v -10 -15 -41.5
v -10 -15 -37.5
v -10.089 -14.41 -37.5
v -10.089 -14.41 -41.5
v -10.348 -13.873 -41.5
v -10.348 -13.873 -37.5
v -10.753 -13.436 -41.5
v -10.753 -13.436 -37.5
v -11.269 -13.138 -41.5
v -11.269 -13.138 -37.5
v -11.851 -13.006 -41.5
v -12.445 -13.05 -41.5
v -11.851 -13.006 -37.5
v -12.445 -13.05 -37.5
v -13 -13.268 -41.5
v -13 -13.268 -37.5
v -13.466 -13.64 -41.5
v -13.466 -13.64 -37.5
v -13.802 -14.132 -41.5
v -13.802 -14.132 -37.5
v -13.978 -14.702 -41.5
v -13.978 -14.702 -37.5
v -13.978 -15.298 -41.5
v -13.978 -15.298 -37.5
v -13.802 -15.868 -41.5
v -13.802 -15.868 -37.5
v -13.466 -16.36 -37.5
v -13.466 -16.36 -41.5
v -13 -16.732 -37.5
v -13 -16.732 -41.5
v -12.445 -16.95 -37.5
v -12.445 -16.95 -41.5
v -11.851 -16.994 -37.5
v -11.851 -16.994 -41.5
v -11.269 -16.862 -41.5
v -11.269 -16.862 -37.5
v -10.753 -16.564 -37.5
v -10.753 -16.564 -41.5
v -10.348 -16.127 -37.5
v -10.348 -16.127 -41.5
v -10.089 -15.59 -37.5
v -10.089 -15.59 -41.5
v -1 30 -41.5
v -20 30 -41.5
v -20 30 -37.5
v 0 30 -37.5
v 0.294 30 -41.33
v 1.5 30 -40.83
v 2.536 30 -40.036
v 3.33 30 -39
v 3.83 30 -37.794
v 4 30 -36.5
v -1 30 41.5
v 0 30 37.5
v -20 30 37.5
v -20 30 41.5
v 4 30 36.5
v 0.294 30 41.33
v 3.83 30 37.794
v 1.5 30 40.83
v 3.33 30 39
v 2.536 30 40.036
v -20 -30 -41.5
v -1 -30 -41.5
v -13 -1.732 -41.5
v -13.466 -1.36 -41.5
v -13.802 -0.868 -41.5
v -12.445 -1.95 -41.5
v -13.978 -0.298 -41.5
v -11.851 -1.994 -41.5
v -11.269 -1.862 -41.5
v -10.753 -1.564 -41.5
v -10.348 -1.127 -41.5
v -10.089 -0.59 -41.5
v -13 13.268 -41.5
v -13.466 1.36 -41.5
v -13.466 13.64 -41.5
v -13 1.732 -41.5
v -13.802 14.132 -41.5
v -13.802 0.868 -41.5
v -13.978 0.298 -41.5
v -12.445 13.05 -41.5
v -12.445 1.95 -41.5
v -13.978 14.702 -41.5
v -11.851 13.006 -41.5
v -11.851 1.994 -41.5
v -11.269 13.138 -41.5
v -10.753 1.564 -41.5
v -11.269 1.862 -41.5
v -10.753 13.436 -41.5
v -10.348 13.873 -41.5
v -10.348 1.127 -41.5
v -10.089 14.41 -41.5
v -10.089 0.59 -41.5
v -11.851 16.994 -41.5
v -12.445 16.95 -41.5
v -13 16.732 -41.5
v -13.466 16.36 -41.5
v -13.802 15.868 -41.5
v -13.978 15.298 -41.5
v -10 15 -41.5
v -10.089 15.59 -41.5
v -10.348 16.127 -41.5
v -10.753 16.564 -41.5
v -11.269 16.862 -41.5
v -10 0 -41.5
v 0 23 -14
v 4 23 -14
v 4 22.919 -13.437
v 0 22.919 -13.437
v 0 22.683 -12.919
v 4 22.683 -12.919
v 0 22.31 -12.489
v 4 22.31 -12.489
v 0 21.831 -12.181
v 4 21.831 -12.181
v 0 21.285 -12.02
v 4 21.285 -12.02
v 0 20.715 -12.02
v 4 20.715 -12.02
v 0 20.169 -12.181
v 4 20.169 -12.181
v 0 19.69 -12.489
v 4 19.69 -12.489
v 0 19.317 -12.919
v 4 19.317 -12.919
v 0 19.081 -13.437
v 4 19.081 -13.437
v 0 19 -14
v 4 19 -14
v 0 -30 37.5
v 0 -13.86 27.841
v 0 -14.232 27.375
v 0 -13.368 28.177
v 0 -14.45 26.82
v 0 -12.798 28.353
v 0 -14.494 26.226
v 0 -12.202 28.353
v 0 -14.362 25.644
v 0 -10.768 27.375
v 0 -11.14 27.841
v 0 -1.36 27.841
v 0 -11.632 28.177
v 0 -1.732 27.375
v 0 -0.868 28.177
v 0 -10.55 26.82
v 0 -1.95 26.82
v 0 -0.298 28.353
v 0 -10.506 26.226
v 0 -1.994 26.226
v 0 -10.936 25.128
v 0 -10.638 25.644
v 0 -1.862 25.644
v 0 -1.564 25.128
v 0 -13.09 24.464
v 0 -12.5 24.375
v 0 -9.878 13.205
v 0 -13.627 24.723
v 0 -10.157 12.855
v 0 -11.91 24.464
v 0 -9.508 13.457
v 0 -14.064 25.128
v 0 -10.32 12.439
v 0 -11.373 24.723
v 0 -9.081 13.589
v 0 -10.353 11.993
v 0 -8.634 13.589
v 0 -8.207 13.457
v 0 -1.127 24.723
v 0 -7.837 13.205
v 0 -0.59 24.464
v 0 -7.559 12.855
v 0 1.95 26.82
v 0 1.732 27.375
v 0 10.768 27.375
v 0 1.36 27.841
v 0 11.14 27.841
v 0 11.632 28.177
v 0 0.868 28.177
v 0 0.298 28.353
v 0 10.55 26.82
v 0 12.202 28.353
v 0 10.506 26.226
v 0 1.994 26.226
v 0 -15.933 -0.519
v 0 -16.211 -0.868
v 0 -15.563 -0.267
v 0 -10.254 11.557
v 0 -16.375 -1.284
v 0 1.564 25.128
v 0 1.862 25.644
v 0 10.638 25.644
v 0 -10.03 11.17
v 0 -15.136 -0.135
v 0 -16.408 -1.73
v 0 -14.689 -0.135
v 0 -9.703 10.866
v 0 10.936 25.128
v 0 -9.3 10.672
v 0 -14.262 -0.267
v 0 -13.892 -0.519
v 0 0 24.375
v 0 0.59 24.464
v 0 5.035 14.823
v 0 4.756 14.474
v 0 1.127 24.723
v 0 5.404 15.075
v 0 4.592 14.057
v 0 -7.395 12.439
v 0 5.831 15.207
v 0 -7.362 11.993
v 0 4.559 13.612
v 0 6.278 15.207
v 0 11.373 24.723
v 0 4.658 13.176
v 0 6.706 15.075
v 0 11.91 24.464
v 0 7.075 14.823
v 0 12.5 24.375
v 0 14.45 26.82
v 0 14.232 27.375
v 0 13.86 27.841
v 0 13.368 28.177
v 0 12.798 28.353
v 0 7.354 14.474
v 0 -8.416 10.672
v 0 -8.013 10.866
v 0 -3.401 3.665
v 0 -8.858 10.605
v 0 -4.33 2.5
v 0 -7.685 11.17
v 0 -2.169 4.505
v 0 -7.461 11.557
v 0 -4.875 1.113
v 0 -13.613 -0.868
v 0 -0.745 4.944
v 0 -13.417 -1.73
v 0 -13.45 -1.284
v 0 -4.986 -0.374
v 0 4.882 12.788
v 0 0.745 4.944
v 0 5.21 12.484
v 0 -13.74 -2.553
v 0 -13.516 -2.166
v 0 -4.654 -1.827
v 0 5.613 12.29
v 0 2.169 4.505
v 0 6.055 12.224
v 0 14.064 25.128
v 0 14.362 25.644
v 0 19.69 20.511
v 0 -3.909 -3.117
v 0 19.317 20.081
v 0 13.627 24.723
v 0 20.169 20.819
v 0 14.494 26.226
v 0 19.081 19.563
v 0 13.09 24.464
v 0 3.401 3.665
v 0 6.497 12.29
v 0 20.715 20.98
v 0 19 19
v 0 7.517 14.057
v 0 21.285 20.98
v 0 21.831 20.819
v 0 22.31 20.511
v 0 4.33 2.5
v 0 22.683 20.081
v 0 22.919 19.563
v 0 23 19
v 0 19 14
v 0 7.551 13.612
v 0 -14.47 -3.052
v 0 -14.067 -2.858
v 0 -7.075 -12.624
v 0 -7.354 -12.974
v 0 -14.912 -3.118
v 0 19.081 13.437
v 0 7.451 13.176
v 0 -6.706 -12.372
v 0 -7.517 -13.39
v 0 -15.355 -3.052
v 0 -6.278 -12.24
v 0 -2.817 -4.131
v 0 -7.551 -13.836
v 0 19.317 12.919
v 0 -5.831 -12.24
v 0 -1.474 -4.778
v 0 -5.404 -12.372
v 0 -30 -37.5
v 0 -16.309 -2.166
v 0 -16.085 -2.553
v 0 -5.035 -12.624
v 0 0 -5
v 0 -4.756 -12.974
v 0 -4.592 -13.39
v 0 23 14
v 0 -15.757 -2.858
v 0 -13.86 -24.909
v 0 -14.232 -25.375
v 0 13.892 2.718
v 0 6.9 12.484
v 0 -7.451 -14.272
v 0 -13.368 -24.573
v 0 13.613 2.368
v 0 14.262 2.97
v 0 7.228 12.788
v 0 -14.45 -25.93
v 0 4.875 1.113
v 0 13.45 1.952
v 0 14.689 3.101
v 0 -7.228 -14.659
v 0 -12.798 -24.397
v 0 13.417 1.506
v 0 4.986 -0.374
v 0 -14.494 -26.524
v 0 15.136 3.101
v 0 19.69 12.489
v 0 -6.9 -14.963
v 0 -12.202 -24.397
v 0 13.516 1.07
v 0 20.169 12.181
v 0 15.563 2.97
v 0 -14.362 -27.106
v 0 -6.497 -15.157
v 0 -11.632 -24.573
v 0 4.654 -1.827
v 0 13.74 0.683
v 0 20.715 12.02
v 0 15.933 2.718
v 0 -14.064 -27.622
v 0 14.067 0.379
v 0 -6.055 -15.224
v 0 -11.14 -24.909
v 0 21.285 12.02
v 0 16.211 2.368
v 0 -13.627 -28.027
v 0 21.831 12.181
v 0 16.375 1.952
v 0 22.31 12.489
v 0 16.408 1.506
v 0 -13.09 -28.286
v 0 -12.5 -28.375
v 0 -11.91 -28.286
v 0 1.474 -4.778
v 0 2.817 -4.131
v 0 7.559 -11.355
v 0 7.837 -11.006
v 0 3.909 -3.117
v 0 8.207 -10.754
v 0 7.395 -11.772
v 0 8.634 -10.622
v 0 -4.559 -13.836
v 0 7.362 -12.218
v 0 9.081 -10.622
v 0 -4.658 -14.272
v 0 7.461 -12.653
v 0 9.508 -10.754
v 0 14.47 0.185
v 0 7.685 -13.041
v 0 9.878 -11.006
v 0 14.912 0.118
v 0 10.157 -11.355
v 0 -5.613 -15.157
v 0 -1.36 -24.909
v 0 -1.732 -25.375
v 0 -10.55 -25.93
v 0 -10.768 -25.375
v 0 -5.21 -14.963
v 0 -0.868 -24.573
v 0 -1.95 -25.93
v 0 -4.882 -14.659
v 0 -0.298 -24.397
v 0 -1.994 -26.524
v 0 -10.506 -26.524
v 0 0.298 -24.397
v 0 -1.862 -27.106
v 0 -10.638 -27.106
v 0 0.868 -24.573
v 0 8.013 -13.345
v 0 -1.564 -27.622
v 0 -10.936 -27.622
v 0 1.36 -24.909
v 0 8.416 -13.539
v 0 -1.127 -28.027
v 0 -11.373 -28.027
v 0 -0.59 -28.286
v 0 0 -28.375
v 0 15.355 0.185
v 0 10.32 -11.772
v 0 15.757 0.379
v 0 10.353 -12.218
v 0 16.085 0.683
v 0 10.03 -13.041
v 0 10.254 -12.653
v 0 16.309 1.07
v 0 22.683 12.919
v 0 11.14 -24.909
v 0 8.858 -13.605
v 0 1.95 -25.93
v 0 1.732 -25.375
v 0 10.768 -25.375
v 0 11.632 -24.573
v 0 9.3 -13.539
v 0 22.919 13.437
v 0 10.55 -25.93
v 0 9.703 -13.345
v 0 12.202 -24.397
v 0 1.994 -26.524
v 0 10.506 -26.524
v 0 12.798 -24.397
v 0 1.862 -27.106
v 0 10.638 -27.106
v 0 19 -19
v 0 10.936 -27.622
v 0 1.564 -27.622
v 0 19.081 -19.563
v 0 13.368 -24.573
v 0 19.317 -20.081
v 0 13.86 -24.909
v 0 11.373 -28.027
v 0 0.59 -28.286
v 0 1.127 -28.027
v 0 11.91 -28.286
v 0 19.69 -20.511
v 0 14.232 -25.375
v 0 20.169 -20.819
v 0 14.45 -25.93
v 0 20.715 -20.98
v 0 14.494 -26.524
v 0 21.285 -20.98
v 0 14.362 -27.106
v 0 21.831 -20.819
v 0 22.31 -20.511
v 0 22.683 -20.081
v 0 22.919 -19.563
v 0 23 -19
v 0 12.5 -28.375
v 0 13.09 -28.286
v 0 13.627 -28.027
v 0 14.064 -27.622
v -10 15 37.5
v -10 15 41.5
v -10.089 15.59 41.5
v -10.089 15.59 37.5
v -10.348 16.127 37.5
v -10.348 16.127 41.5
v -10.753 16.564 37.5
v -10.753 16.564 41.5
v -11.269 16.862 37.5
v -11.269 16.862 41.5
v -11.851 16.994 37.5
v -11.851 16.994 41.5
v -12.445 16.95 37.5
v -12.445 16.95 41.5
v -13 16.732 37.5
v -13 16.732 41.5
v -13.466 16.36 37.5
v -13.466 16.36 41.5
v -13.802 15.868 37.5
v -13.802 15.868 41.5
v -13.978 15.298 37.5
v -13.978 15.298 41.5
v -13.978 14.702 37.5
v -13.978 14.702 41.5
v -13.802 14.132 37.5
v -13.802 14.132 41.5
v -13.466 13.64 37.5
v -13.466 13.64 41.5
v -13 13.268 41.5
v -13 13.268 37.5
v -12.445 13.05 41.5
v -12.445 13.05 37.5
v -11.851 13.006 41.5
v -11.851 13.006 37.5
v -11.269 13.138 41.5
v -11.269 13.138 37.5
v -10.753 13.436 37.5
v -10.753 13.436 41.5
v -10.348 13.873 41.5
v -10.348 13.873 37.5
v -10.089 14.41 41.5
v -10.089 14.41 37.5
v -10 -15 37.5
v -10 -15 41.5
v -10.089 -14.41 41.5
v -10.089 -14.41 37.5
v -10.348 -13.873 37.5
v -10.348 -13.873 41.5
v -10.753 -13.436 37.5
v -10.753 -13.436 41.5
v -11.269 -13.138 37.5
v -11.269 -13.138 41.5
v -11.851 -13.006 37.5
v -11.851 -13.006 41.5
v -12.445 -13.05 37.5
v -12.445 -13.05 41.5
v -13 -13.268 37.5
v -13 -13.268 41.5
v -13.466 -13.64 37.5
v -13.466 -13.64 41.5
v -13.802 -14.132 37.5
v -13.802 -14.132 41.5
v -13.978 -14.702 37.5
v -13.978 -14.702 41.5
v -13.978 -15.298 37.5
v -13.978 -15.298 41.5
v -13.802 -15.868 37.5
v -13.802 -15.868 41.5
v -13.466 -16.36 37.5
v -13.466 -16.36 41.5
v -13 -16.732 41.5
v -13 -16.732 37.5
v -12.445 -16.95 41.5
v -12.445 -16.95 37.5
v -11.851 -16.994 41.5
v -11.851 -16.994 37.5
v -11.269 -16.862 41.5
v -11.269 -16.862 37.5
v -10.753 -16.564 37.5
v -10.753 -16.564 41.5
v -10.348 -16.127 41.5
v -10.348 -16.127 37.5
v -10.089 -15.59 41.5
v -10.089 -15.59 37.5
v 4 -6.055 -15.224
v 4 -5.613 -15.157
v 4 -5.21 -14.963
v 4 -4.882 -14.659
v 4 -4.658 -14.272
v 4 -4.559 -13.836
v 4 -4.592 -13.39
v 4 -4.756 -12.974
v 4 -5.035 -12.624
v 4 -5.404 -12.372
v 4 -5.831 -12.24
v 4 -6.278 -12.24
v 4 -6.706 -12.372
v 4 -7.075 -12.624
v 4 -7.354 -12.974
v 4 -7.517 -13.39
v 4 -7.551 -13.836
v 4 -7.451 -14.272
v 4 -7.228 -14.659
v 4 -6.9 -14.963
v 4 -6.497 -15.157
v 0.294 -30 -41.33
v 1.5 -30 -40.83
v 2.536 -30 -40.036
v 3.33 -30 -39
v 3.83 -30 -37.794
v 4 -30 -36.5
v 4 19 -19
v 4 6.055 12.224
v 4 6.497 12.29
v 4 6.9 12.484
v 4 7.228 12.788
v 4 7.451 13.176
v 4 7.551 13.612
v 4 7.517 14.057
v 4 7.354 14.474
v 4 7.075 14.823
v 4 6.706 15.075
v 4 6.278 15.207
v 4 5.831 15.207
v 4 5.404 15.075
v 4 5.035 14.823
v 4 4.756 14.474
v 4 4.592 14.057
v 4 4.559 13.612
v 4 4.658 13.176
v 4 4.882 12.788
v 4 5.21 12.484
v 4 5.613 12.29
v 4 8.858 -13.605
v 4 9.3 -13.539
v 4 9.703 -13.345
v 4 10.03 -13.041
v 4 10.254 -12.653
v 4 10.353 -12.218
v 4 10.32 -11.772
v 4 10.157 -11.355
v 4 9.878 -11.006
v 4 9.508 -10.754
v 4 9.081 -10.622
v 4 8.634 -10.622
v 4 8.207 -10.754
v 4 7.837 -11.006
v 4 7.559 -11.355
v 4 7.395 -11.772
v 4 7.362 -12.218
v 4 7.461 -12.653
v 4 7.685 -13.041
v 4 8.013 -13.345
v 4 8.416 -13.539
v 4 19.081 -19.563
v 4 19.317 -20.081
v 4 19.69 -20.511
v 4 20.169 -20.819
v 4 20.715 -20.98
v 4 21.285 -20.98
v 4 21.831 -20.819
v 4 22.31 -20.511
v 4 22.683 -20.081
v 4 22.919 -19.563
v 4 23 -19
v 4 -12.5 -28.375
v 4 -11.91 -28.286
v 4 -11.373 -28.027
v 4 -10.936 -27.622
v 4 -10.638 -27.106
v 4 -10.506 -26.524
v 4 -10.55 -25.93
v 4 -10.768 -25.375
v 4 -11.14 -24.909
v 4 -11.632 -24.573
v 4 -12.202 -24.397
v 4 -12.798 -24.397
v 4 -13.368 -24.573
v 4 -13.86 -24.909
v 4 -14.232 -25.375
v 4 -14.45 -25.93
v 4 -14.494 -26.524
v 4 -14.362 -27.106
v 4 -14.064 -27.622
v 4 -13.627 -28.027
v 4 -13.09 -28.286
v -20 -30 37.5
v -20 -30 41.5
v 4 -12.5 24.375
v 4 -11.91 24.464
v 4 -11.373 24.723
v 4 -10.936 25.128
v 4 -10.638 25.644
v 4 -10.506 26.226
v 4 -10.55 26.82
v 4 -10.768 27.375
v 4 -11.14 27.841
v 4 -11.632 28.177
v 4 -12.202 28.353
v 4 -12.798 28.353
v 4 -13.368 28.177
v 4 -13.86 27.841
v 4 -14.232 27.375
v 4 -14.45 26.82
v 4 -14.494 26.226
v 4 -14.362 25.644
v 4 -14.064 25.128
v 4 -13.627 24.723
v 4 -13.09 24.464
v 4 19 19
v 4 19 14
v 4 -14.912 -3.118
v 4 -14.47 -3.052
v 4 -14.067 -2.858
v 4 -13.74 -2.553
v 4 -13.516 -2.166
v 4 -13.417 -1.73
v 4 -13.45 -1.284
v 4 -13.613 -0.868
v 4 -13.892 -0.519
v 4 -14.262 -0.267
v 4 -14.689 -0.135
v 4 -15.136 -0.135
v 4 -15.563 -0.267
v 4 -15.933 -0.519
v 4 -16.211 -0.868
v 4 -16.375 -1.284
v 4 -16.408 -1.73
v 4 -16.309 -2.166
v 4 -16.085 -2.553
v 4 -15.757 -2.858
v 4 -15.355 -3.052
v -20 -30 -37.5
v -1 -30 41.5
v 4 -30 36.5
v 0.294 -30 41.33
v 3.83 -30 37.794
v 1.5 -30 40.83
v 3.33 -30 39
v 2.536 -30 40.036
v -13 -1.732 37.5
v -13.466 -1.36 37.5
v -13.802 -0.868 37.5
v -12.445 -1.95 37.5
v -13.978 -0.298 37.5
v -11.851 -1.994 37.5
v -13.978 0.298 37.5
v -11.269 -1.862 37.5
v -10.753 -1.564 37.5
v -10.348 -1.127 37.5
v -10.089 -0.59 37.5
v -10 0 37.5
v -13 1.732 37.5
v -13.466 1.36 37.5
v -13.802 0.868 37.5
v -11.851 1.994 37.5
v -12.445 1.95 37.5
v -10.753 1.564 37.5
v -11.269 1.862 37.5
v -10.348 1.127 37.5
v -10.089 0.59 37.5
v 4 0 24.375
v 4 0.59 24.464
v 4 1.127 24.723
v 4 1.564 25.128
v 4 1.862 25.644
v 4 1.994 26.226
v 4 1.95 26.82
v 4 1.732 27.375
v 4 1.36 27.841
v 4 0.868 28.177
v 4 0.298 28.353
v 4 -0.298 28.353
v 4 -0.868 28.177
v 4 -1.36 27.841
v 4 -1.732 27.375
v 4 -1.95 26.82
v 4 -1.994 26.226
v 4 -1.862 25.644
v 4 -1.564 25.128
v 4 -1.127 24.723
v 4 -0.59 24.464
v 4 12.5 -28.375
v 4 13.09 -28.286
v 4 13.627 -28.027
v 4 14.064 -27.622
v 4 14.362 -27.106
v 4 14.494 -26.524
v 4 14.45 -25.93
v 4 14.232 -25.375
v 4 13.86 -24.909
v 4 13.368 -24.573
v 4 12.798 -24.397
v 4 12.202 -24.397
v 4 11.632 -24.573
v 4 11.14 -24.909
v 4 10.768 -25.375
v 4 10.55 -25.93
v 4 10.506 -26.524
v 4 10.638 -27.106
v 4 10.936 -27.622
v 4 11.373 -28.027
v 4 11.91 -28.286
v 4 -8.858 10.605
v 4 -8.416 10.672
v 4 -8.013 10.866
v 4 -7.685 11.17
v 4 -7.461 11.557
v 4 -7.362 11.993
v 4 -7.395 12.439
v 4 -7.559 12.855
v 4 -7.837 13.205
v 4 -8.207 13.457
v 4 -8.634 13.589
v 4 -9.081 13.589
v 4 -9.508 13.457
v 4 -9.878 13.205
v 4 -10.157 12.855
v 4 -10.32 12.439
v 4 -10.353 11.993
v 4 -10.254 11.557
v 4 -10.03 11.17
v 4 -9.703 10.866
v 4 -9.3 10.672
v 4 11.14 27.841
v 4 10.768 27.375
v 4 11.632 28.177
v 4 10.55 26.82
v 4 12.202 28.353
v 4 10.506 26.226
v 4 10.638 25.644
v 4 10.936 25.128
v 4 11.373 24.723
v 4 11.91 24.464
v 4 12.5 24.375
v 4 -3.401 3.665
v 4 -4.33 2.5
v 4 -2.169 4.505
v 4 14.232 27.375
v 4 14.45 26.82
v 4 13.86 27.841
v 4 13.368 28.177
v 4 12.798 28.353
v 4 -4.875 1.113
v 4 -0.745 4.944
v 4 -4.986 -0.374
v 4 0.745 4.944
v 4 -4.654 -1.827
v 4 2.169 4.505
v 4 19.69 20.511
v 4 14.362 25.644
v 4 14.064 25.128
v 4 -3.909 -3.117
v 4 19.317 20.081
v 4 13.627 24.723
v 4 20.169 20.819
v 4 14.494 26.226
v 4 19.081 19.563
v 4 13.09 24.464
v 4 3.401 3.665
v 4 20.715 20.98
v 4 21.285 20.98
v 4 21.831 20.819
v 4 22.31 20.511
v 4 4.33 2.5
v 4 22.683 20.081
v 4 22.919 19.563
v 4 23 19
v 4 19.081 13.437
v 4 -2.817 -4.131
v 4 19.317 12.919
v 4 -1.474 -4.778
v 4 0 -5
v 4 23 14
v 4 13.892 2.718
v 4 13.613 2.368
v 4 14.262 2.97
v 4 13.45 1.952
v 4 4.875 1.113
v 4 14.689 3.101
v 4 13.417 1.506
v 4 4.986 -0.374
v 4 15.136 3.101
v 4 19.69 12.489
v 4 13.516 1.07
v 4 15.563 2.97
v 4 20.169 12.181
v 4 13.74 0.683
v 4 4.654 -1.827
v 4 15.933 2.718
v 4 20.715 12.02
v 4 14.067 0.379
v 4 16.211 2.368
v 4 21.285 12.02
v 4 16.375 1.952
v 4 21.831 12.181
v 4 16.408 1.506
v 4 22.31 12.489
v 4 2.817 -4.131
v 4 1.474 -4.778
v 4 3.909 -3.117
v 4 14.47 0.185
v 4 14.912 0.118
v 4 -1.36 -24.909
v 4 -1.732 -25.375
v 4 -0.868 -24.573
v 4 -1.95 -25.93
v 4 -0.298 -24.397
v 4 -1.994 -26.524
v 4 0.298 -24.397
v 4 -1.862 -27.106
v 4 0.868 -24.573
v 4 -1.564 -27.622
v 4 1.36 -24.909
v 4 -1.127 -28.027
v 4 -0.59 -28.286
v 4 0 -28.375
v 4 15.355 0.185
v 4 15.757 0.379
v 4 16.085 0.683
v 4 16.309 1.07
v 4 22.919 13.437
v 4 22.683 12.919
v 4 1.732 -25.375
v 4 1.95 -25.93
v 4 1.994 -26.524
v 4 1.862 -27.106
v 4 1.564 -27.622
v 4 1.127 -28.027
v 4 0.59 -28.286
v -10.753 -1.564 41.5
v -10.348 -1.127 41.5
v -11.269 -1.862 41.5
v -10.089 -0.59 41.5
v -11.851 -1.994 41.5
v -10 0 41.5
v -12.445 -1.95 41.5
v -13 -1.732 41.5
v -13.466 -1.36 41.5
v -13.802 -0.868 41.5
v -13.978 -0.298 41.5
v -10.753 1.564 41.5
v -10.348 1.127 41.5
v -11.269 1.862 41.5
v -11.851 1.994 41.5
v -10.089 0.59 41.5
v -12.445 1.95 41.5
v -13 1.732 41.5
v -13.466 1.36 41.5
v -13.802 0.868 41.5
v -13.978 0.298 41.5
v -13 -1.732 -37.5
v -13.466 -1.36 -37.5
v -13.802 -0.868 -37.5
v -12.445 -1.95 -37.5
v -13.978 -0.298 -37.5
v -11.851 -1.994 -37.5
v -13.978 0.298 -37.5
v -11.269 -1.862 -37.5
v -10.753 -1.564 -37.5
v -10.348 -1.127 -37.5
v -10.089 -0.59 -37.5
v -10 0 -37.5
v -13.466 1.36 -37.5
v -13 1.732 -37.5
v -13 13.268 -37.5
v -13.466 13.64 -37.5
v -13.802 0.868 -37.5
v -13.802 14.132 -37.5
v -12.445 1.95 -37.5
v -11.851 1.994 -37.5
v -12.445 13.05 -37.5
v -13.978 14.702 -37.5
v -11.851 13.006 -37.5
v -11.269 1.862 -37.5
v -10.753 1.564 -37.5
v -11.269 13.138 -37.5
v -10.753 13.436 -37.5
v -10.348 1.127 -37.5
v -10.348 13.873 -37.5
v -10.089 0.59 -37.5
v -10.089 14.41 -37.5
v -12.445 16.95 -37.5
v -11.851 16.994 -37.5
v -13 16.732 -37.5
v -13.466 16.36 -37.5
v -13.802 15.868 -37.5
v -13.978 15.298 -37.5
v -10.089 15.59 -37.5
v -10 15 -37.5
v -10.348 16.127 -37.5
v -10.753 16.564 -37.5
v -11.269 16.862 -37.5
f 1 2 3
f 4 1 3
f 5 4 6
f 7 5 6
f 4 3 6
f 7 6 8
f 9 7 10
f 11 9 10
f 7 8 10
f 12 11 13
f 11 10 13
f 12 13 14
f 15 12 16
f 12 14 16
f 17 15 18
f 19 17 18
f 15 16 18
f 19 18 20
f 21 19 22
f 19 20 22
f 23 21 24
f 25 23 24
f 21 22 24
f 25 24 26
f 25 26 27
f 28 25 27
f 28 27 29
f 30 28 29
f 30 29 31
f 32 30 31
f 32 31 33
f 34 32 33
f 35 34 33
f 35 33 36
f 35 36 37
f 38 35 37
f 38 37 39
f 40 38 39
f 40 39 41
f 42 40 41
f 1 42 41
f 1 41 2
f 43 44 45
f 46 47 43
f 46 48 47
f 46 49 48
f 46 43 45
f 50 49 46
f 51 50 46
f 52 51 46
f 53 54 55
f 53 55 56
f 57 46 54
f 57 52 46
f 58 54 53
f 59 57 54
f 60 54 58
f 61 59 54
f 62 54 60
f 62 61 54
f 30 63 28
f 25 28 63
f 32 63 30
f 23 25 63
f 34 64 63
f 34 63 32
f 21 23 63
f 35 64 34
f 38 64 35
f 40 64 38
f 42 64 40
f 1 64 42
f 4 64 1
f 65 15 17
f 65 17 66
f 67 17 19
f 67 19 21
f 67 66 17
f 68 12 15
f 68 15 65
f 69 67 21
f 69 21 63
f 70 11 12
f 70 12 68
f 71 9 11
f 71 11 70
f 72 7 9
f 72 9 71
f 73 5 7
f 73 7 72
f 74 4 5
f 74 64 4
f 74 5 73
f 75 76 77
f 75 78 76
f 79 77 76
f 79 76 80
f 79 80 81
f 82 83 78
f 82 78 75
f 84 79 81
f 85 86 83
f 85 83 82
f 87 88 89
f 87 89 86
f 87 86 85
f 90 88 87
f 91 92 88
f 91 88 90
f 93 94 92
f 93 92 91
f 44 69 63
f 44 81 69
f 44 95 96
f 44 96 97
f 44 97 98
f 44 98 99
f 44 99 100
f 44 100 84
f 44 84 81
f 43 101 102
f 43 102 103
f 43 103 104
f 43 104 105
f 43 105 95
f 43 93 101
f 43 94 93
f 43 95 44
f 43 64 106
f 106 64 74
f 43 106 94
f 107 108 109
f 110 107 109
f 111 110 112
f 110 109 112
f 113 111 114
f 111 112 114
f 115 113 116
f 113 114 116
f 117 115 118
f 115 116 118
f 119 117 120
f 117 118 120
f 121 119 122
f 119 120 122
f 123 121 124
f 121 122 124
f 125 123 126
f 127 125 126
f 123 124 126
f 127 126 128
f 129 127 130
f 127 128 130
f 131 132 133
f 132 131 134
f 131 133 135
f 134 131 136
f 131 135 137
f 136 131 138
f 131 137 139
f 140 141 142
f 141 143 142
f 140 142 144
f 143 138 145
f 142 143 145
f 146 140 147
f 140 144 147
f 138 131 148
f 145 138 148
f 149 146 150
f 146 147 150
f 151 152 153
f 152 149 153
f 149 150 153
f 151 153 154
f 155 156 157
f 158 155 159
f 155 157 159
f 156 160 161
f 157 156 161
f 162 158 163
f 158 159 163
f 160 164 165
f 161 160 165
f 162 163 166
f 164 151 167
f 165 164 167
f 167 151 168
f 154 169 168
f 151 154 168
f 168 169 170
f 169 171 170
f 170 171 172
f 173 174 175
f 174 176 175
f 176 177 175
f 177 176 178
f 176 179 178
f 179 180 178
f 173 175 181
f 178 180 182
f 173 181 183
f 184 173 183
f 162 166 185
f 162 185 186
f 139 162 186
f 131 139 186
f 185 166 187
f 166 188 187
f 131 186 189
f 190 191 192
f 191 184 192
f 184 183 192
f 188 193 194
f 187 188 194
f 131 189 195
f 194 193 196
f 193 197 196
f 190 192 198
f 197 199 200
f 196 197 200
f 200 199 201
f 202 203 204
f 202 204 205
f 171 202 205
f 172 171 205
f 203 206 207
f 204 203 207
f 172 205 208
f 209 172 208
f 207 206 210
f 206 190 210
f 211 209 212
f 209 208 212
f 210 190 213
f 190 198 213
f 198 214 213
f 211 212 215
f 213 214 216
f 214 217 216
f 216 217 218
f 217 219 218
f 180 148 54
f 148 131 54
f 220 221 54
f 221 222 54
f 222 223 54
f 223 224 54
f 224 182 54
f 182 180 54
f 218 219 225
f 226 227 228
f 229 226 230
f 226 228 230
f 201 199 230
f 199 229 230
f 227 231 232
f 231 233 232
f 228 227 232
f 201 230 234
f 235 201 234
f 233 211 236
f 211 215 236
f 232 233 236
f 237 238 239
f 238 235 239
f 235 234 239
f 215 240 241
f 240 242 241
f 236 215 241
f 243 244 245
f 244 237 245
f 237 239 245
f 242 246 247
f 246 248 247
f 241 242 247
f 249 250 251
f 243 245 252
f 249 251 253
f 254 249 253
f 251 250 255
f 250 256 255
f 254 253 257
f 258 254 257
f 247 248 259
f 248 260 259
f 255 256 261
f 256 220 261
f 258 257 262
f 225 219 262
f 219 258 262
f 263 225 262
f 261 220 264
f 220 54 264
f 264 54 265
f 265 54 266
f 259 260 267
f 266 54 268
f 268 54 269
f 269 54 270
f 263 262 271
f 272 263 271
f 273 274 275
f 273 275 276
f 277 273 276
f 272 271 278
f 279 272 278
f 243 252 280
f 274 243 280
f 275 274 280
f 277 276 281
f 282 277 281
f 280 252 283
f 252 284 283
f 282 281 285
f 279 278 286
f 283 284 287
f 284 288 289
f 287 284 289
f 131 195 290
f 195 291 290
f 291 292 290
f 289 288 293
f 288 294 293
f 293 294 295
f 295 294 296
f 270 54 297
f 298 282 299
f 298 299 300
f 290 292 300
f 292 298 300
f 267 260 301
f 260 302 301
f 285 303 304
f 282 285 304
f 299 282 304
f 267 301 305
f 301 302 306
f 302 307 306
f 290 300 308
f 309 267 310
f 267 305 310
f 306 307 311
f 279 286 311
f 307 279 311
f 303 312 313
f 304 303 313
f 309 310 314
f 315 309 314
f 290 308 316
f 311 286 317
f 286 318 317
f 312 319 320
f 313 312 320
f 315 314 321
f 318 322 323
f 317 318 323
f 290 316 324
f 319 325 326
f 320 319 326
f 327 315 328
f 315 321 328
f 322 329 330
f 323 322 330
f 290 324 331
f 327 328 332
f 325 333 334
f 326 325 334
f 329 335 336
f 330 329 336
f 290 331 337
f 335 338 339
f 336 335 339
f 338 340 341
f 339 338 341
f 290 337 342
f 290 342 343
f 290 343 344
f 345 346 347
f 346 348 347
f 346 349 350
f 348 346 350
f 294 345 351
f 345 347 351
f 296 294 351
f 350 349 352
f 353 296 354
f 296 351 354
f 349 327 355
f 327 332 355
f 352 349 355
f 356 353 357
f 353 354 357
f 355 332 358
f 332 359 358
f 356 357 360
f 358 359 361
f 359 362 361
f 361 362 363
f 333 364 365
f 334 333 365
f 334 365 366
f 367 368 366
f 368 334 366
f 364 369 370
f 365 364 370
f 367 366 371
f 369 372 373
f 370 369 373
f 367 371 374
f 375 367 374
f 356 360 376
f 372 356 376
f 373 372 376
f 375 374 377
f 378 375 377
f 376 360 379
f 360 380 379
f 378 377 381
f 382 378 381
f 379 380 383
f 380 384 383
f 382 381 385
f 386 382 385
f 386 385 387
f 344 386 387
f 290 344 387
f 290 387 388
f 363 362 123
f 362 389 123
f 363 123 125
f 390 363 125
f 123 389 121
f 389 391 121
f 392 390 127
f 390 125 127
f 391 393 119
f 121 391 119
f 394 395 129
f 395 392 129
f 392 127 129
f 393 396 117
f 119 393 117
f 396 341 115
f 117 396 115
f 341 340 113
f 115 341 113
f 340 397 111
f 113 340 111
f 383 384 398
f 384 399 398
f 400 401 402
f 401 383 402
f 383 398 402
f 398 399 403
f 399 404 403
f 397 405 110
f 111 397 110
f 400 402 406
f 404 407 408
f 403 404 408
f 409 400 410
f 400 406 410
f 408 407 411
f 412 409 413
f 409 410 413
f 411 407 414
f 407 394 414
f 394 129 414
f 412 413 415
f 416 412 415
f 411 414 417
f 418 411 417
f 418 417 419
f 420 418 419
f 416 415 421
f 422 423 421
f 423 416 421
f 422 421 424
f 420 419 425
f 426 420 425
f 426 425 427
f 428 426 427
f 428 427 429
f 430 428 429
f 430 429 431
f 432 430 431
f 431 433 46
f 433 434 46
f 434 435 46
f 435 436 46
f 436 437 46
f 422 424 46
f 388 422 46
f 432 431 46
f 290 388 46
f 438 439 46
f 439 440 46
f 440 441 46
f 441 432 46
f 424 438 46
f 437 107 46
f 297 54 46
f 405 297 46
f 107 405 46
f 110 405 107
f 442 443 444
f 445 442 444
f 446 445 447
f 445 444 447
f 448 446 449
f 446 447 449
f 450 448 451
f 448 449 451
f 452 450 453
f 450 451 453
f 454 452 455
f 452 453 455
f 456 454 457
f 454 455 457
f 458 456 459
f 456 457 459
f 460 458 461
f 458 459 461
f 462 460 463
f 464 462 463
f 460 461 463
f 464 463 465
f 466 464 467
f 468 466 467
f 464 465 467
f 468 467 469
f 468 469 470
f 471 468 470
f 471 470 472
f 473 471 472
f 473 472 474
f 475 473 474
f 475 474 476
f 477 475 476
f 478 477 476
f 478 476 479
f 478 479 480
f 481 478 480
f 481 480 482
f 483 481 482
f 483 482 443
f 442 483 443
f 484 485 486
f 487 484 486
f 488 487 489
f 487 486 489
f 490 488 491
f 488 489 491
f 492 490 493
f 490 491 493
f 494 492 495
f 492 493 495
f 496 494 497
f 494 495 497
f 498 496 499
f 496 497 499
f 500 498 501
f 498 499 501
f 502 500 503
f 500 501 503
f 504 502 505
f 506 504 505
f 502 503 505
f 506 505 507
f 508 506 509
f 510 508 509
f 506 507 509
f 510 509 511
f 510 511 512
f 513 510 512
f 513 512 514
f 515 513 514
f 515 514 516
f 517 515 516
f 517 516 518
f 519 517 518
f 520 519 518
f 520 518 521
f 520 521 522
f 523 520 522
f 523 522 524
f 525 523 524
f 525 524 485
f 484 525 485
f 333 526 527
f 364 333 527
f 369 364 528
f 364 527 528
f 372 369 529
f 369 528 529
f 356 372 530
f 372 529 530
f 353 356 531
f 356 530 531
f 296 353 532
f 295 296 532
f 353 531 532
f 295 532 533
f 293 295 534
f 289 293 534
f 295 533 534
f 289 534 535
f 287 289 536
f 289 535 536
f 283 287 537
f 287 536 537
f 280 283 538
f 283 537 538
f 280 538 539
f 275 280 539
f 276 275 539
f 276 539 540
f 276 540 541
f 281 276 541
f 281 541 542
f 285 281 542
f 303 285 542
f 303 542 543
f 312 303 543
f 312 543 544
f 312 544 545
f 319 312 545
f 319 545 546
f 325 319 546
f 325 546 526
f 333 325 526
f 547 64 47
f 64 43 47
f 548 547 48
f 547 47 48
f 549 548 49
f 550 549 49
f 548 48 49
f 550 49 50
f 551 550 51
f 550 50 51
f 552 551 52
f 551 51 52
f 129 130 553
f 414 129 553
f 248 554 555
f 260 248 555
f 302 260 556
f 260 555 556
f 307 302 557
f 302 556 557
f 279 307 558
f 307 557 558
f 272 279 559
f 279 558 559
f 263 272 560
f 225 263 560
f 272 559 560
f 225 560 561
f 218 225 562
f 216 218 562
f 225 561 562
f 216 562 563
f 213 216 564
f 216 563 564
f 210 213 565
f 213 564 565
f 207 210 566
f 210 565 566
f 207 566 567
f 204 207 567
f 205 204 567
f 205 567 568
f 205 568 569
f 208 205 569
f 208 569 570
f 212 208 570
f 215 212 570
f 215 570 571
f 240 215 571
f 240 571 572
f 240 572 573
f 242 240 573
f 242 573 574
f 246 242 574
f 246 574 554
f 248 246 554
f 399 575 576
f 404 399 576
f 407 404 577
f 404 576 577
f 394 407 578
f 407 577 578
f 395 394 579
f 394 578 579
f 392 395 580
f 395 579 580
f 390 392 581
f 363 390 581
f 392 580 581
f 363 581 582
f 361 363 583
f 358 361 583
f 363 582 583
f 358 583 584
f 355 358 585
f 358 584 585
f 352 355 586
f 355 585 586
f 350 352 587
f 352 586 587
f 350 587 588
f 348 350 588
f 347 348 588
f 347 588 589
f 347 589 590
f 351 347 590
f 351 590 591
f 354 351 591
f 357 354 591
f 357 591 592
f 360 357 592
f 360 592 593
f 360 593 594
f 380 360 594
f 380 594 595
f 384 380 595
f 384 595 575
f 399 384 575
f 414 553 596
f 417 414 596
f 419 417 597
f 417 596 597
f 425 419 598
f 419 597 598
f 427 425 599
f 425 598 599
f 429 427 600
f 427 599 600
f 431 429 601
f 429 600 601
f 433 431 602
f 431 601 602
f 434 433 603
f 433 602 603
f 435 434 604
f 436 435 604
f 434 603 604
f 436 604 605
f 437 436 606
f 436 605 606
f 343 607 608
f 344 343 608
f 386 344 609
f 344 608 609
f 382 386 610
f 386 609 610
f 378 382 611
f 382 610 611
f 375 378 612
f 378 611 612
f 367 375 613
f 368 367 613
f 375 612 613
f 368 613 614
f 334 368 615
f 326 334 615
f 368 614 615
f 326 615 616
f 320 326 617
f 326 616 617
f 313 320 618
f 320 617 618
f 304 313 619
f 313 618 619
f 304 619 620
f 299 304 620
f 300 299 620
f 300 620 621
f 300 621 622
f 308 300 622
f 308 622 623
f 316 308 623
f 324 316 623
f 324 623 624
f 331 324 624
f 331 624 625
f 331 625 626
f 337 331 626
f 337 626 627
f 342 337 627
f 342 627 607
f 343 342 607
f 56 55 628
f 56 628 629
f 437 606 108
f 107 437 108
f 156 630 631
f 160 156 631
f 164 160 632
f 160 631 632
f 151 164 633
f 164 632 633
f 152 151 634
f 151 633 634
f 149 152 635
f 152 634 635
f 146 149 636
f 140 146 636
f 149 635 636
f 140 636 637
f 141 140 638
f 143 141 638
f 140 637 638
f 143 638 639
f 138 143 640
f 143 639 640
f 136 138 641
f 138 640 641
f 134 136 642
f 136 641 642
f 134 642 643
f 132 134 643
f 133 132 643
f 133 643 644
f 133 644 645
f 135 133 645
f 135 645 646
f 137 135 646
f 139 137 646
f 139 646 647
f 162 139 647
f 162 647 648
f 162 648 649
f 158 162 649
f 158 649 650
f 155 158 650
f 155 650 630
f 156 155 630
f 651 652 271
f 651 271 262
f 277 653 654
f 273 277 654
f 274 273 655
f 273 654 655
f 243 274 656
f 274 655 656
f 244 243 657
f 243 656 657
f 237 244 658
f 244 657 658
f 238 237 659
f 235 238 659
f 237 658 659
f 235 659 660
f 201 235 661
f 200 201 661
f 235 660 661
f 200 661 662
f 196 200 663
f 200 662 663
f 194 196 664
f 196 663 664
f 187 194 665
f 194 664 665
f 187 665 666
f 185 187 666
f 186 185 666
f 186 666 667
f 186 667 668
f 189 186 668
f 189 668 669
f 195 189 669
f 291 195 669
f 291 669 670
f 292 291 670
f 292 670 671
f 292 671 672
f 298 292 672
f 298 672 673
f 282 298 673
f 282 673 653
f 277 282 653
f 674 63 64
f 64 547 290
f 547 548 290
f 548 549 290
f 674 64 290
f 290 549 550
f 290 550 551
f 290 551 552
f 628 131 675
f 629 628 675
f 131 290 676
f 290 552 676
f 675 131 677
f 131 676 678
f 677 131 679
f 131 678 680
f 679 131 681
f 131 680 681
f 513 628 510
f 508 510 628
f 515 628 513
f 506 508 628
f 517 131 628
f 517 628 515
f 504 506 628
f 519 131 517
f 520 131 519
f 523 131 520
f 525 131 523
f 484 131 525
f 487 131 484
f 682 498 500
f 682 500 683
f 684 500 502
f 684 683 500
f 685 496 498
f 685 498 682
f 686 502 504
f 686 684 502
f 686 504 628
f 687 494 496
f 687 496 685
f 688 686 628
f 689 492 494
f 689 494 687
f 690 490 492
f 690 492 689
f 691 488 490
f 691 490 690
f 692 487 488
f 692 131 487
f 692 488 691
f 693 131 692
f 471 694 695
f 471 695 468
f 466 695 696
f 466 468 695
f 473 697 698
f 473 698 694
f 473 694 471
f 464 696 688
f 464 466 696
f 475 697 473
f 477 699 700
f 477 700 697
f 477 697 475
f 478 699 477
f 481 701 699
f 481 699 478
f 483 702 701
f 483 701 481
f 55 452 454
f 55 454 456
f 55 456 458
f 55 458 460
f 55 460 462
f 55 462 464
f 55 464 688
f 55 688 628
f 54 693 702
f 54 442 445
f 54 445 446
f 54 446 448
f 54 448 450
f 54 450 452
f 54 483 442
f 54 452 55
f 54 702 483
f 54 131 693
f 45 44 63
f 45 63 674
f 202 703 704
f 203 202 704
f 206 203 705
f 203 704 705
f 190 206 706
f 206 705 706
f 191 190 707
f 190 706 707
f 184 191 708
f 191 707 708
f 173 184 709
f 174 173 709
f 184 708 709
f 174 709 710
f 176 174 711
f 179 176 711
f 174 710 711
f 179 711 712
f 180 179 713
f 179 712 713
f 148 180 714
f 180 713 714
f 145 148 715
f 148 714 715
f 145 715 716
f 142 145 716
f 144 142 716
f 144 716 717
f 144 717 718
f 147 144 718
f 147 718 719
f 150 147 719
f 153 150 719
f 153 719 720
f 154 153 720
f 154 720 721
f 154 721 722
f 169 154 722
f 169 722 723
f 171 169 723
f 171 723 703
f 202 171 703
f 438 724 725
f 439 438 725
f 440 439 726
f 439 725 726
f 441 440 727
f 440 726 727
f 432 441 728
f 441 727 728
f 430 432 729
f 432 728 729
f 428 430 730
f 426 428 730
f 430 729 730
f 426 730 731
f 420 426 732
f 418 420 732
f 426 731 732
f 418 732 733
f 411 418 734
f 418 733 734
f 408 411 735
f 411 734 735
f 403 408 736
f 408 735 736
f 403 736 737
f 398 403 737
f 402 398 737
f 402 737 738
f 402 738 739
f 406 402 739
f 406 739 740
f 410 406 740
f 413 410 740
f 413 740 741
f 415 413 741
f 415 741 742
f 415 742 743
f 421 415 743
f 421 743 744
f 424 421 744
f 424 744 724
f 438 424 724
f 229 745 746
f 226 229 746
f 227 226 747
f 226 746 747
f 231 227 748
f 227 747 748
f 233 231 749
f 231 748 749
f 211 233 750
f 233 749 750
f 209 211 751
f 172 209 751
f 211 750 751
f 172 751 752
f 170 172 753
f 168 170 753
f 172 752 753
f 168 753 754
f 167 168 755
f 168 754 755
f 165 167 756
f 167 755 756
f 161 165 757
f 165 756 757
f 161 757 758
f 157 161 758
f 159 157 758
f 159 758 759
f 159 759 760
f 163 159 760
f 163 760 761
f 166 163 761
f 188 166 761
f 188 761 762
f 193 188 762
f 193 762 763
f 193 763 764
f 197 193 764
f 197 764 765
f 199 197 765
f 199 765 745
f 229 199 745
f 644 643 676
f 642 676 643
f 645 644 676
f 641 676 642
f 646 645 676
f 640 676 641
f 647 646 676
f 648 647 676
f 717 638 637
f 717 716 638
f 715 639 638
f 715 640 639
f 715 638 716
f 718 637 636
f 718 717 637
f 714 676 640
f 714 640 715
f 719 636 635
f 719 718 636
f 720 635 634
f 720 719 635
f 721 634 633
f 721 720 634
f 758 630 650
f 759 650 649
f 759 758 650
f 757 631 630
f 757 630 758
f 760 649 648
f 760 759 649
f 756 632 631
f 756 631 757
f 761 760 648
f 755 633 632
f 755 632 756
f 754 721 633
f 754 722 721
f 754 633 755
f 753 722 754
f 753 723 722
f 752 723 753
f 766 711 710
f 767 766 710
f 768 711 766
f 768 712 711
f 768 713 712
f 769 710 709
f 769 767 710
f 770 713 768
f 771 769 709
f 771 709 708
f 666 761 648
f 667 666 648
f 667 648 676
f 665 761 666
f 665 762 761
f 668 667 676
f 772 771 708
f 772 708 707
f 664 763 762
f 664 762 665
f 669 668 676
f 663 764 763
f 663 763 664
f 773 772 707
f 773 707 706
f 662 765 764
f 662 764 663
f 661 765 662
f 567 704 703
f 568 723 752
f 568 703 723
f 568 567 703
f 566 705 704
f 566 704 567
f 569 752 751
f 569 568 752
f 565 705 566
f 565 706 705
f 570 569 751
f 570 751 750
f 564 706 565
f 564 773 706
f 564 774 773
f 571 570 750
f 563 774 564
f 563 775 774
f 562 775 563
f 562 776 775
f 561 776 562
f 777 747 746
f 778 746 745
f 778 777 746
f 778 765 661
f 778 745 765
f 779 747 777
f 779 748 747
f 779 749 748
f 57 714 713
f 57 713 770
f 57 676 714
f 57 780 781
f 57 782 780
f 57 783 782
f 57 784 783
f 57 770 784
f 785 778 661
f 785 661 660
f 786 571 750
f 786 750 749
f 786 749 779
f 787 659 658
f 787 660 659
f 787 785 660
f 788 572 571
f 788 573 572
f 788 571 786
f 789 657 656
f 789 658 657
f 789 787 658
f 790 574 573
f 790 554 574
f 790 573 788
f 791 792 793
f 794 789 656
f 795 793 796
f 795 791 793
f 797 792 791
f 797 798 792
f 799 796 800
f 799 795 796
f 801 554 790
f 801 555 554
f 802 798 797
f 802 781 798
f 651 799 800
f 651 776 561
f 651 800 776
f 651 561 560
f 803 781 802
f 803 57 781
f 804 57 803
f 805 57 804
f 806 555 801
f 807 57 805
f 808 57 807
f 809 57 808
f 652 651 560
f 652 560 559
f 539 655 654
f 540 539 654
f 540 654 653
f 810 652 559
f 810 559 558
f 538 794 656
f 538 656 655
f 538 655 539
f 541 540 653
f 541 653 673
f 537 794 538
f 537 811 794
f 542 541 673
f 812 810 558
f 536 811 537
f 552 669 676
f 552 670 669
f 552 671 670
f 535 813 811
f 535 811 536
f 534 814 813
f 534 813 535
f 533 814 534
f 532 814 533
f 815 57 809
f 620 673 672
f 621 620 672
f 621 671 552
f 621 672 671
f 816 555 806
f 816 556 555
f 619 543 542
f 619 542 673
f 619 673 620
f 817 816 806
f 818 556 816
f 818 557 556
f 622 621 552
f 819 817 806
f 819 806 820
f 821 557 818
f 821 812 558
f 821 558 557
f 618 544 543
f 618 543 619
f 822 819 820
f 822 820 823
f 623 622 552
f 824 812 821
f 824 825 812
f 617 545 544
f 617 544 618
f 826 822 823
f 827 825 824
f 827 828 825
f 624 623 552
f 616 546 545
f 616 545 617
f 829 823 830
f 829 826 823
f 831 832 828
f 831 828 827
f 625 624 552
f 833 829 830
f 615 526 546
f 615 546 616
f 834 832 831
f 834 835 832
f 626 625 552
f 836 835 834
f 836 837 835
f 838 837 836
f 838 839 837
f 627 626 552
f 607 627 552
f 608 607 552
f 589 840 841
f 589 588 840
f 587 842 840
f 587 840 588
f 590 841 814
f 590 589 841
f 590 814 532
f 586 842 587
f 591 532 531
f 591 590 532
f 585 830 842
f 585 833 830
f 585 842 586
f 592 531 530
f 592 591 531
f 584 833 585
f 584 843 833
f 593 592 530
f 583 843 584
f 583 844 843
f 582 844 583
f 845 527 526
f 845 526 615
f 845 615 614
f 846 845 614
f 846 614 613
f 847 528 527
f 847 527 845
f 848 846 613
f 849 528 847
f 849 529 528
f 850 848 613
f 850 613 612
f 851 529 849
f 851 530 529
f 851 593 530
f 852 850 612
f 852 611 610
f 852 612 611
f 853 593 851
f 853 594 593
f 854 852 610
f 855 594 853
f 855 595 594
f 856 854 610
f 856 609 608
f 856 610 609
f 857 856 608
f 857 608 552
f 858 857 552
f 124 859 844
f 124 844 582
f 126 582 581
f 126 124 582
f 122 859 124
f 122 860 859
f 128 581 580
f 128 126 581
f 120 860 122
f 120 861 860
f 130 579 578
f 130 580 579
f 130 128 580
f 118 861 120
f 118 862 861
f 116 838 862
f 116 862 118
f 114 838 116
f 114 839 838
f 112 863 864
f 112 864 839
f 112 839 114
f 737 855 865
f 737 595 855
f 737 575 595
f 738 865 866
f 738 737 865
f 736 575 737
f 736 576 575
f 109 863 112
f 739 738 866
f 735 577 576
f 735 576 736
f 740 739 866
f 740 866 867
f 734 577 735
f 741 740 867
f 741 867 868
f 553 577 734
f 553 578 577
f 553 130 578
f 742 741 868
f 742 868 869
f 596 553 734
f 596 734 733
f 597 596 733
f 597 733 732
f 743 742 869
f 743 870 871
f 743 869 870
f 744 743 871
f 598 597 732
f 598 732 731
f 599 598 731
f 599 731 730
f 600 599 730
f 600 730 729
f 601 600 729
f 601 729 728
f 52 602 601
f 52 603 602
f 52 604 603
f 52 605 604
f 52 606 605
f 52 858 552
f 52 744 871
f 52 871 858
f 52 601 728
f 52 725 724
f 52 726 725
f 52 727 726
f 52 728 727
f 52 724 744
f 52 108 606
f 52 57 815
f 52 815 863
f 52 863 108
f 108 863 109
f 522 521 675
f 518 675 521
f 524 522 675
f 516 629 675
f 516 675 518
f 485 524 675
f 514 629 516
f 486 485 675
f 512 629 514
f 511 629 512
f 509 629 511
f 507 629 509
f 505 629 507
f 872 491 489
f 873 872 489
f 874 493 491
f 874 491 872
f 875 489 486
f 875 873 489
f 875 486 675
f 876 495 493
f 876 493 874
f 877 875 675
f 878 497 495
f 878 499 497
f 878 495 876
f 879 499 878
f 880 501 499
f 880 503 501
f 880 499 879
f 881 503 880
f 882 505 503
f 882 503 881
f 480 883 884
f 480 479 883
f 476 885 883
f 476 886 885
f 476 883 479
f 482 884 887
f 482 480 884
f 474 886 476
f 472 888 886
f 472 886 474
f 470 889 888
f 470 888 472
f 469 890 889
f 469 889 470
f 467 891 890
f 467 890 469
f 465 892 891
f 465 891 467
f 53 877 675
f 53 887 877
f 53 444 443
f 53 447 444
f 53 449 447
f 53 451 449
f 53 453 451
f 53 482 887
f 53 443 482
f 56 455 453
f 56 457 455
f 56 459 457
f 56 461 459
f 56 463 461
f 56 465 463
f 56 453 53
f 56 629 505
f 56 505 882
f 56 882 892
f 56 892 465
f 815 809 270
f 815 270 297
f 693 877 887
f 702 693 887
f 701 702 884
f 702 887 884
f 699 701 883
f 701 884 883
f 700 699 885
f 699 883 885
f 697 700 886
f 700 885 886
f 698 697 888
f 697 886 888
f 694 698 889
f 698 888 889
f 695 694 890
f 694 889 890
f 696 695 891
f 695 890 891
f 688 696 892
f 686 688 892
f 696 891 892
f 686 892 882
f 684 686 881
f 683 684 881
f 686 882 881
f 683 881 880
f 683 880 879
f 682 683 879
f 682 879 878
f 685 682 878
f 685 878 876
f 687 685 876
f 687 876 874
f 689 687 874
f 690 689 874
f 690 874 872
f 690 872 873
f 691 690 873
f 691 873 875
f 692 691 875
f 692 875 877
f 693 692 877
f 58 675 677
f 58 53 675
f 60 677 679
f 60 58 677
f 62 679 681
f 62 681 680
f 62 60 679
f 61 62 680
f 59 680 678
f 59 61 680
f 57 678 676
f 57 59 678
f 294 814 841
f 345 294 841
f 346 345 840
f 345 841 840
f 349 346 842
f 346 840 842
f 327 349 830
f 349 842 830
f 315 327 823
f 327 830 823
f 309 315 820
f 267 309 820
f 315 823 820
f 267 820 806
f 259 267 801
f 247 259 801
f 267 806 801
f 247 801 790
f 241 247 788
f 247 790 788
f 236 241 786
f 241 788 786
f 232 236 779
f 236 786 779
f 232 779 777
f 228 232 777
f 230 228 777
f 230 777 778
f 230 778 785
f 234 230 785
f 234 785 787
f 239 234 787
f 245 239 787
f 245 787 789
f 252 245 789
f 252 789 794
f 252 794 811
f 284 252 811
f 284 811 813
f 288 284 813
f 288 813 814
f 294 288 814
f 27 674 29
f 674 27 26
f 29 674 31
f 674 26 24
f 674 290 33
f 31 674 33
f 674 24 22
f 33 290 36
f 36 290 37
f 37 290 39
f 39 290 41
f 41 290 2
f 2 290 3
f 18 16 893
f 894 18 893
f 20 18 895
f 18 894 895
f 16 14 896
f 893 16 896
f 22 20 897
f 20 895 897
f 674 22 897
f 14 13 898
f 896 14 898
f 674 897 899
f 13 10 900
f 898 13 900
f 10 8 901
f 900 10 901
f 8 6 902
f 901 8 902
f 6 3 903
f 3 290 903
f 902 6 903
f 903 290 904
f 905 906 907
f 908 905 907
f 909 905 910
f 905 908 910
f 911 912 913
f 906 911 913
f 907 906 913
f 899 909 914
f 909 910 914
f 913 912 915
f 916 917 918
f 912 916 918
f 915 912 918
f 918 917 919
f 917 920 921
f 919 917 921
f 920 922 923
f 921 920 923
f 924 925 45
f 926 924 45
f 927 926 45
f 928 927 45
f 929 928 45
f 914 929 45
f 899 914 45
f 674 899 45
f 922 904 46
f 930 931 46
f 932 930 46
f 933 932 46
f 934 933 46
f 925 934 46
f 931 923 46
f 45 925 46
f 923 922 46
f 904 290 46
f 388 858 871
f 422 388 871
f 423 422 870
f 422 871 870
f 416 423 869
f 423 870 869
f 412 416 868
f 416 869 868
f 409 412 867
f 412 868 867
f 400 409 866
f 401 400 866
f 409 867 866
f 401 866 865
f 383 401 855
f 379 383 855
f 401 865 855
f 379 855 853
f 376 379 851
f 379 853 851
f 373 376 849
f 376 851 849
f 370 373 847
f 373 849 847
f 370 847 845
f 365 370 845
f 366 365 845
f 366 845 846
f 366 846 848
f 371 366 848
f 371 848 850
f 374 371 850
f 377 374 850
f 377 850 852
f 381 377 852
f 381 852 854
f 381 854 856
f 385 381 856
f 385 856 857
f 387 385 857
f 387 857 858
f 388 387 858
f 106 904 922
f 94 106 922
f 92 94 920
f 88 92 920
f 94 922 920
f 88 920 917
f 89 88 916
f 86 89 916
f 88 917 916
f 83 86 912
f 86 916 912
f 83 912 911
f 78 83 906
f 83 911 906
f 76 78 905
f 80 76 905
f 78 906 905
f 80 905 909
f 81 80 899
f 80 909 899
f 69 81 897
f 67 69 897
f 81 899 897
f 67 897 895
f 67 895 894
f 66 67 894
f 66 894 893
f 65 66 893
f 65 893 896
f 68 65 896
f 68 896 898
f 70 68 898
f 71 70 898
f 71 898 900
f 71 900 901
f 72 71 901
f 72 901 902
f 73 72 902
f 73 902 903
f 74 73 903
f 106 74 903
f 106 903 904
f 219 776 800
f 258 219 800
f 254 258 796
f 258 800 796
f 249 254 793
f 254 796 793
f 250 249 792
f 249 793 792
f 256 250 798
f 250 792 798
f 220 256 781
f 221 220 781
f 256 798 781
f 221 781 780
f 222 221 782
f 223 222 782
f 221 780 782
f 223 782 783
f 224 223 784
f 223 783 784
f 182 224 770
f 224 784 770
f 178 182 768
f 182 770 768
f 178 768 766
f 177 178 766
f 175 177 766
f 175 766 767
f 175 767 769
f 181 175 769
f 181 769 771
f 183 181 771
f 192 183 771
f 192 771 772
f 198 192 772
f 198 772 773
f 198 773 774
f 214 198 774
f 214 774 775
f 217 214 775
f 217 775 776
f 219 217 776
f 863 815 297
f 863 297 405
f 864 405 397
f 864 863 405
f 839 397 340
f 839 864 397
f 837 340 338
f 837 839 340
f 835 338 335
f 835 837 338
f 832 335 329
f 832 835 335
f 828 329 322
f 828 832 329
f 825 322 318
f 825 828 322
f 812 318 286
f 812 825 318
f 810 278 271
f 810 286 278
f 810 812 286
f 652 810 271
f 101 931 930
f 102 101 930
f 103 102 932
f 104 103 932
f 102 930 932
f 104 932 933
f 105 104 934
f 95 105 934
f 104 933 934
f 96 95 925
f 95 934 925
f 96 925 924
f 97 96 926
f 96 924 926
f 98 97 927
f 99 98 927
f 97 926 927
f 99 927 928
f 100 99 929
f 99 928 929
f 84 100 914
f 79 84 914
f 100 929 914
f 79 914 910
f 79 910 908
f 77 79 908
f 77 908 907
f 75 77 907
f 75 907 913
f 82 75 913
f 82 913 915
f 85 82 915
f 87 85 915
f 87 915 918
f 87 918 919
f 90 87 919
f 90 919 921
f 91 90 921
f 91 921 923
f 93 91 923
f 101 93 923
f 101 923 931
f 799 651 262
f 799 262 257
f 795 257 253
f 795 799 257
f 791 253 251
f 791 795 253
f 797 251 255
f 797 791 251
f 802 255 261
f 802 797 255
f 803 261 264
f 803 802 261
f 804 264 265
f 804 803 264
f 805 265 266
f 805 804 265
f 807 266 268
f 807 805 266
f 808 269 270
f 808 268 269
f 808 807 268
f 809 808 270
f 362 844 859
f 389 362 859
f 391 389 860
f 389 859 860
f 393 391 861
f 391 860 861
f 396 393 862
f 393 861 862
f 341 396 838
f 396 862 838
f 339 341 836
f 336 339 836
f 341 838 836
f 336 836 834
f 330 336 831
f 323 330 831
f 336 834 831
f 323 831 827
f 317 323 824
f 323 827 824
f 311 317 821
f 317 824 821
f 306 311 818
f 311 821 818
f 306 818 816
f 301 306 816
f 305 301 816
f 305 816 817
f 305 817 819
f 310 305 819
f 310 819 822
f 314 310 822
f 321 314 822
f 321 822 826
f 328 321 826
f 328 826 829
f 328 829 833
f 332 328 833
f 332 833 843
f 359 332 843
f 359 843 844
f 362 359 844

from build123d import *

# Parameters (mm, degrees)
SKETCH1_W           = 83
SKETCH1_H           = 60
BOSS_EXTRUDE1_DEPTH = 4
SKETCH2_R           = 5
CUT_EXTRUDE1_DEPTH  = 5
SKETCH4_R           = 1.5
CUT_EXTRUDE2_DEPTH  = 10
SKETCH6_R           = 2
CUT_EXTRUDE3_DEPTH  = 10
CUT_EXTRUDE4_DEPTH  = 10
SKETCH8_W           = 4.00000008
SKETCH8_H           = 60
SKETCH8_W_2         = 4
BOSS_EXTRUDE2_DEPTH = 20
FILLET1_R           = 5
SKETCH10_R          = 2
CUT_EXTRUDE5_DEPTH  = 84


with BuildPart() as part:
    # Sketch1 → Boss-Extrude1 (new body)
    with BuildSketch(Plane(origin=(0, 0, 0), x_dir=(0, 0, -1), z_dir=(1, 0, 0))):
        Rectangle(SKETCH1_W, SKETCH1_H)
    extrude(amount=BOSS_EXTRUDE1_DEPTH)

    # Sketch2 → Cut-Extrude1 (cut, through all)
    with BuildSketch(Plane(origin=(4, 0, 0), x_dir=(0, 0, -1), z_dir=(1, 0, 0))):
        Circle(SKETCH2_R)
    extrude(amount=-CUT_EXTRUDE1_DEPTH, mode=Mode.SUBTRACT)

    # Sketch4 → Cut-Extrude2 (cut)
    with BuildSketch(Plane(origin=(4, 0, 0), x_dir=(0, 0, -1), z_dir=(1, 0, 0))):
        with Locations((-13.72367631, 6.054808712)):
            Circle(SKETCH4_R)
        with Locations((-12.105456315, -8.857647962)):
            Circle(SKETCH4_R)
        with Locations((1.618219995, -14.912456674)):
            Circle(SKETCH4_R)
        with Locations((13.72367631, -6.054808712)):
            Circle(SKETCH4_R)
        with Locations((12.105456315, 8.857647962)):
            Circle(SKETCH4_R)
        with Locations((-1.618219995, 14.912456674)):
            Circle(SKETCH4_R)
    extrude(amount=-CUT_EXTRUDE2_DEPTH, mode=Mode.SUBTRACT)

    # Sketch6 → Cut-Extrude3 (cut)
    with BuildSketch(Plane(origin=(4, 0, 0), x_dir=(0, 0, -1), z_dir=(1, 0, 0))):
        with Locations((-26.375, 12.5)):
            Circle(SKETCH6_R)
        with Locations((-26.375, 0)):
            Circle(SKETCH6_R)
        with Locations((-26.375, -12.5)):
            Circle(SKETCH6_R)
        with Locations((26.375, 12.5)):
            Circle(SKETCH6_R)
        with Locations((26.375, 0)):
            Circle(SKETCH6_R)
        with Locations((26.375, -12.5)):
            Circle(SKETCH6_R)
    extrude(amount=-CUT_EXTRUDE3_DEPTH, mode=Mode.SUBTRACT)

    # Sketch7 → Cut-Extrude4 (cut)
    with BuildSketch(Plane(origin=(4, 0, 0), x_dir=(0, 0, -1), z_dir=(1, 0, 0))):
        with BuildLine():
            Line((-19, 23), (-14, 23))
            ThreePointArc((-14, 23), (-12, 21), (-14, 19))
            Line((-14, 19), (-19, 19))
            ThreePointArc((-19, 19), (-21, 21), (-19, 23))
        make_face()
        with BuildLine():
            Line((19, 23), (14, 23))
            ThreePointArc((14, 23), (12, 21), (14, 19))
            Line((14, 19), (19, 19))
            ThreePointArc((19, 19), (21, 21), (19, 23))
        make_face()
    extrude(amount=-CUT_EXTRUDE4_DEPTH, mode=Mode.SUBTRACT)

    # Sketch8 → Boss-Extrude2 (add)
    with BuildSketch(Plane.ZY):
        with Locations((-39.49999996, 0)):
            Rectangle(SKETCH8_W, SKETCH8_H)
        with Locations((39.5, 0)):
            Rectangle(SKETCH8_W_2, SKETCH8_H)
    extrude(amount=BOSS_EXTRUDE2_DEPTH)

    # Fillet1
    fillet1_edges = [part.edges().sort_by_distance(p)[0] for p in [
        (4, 0, -41.5),
        (4, 0, 41.5),
    ]]
    fillet(fillet1_edges, radius=FILLET1_R)

    # Sketch10 → Cut-Extrude5 (cut, through all)
    with BuildSketch(Plane.XY.offset(41.5)):
        with Locations((-12, 15)):
            Circle(SKETCH10_R)
        with Locations((-12, 0)):
            Circle(SKETCH10_R)
        with Locations((-12, -15)):
            Circle(SKETCH10_R)
    extrude(amount=-CUT_EXTRUDE5_DEPTH, mode=Mode.SUBTRACT)


solid = part.part
